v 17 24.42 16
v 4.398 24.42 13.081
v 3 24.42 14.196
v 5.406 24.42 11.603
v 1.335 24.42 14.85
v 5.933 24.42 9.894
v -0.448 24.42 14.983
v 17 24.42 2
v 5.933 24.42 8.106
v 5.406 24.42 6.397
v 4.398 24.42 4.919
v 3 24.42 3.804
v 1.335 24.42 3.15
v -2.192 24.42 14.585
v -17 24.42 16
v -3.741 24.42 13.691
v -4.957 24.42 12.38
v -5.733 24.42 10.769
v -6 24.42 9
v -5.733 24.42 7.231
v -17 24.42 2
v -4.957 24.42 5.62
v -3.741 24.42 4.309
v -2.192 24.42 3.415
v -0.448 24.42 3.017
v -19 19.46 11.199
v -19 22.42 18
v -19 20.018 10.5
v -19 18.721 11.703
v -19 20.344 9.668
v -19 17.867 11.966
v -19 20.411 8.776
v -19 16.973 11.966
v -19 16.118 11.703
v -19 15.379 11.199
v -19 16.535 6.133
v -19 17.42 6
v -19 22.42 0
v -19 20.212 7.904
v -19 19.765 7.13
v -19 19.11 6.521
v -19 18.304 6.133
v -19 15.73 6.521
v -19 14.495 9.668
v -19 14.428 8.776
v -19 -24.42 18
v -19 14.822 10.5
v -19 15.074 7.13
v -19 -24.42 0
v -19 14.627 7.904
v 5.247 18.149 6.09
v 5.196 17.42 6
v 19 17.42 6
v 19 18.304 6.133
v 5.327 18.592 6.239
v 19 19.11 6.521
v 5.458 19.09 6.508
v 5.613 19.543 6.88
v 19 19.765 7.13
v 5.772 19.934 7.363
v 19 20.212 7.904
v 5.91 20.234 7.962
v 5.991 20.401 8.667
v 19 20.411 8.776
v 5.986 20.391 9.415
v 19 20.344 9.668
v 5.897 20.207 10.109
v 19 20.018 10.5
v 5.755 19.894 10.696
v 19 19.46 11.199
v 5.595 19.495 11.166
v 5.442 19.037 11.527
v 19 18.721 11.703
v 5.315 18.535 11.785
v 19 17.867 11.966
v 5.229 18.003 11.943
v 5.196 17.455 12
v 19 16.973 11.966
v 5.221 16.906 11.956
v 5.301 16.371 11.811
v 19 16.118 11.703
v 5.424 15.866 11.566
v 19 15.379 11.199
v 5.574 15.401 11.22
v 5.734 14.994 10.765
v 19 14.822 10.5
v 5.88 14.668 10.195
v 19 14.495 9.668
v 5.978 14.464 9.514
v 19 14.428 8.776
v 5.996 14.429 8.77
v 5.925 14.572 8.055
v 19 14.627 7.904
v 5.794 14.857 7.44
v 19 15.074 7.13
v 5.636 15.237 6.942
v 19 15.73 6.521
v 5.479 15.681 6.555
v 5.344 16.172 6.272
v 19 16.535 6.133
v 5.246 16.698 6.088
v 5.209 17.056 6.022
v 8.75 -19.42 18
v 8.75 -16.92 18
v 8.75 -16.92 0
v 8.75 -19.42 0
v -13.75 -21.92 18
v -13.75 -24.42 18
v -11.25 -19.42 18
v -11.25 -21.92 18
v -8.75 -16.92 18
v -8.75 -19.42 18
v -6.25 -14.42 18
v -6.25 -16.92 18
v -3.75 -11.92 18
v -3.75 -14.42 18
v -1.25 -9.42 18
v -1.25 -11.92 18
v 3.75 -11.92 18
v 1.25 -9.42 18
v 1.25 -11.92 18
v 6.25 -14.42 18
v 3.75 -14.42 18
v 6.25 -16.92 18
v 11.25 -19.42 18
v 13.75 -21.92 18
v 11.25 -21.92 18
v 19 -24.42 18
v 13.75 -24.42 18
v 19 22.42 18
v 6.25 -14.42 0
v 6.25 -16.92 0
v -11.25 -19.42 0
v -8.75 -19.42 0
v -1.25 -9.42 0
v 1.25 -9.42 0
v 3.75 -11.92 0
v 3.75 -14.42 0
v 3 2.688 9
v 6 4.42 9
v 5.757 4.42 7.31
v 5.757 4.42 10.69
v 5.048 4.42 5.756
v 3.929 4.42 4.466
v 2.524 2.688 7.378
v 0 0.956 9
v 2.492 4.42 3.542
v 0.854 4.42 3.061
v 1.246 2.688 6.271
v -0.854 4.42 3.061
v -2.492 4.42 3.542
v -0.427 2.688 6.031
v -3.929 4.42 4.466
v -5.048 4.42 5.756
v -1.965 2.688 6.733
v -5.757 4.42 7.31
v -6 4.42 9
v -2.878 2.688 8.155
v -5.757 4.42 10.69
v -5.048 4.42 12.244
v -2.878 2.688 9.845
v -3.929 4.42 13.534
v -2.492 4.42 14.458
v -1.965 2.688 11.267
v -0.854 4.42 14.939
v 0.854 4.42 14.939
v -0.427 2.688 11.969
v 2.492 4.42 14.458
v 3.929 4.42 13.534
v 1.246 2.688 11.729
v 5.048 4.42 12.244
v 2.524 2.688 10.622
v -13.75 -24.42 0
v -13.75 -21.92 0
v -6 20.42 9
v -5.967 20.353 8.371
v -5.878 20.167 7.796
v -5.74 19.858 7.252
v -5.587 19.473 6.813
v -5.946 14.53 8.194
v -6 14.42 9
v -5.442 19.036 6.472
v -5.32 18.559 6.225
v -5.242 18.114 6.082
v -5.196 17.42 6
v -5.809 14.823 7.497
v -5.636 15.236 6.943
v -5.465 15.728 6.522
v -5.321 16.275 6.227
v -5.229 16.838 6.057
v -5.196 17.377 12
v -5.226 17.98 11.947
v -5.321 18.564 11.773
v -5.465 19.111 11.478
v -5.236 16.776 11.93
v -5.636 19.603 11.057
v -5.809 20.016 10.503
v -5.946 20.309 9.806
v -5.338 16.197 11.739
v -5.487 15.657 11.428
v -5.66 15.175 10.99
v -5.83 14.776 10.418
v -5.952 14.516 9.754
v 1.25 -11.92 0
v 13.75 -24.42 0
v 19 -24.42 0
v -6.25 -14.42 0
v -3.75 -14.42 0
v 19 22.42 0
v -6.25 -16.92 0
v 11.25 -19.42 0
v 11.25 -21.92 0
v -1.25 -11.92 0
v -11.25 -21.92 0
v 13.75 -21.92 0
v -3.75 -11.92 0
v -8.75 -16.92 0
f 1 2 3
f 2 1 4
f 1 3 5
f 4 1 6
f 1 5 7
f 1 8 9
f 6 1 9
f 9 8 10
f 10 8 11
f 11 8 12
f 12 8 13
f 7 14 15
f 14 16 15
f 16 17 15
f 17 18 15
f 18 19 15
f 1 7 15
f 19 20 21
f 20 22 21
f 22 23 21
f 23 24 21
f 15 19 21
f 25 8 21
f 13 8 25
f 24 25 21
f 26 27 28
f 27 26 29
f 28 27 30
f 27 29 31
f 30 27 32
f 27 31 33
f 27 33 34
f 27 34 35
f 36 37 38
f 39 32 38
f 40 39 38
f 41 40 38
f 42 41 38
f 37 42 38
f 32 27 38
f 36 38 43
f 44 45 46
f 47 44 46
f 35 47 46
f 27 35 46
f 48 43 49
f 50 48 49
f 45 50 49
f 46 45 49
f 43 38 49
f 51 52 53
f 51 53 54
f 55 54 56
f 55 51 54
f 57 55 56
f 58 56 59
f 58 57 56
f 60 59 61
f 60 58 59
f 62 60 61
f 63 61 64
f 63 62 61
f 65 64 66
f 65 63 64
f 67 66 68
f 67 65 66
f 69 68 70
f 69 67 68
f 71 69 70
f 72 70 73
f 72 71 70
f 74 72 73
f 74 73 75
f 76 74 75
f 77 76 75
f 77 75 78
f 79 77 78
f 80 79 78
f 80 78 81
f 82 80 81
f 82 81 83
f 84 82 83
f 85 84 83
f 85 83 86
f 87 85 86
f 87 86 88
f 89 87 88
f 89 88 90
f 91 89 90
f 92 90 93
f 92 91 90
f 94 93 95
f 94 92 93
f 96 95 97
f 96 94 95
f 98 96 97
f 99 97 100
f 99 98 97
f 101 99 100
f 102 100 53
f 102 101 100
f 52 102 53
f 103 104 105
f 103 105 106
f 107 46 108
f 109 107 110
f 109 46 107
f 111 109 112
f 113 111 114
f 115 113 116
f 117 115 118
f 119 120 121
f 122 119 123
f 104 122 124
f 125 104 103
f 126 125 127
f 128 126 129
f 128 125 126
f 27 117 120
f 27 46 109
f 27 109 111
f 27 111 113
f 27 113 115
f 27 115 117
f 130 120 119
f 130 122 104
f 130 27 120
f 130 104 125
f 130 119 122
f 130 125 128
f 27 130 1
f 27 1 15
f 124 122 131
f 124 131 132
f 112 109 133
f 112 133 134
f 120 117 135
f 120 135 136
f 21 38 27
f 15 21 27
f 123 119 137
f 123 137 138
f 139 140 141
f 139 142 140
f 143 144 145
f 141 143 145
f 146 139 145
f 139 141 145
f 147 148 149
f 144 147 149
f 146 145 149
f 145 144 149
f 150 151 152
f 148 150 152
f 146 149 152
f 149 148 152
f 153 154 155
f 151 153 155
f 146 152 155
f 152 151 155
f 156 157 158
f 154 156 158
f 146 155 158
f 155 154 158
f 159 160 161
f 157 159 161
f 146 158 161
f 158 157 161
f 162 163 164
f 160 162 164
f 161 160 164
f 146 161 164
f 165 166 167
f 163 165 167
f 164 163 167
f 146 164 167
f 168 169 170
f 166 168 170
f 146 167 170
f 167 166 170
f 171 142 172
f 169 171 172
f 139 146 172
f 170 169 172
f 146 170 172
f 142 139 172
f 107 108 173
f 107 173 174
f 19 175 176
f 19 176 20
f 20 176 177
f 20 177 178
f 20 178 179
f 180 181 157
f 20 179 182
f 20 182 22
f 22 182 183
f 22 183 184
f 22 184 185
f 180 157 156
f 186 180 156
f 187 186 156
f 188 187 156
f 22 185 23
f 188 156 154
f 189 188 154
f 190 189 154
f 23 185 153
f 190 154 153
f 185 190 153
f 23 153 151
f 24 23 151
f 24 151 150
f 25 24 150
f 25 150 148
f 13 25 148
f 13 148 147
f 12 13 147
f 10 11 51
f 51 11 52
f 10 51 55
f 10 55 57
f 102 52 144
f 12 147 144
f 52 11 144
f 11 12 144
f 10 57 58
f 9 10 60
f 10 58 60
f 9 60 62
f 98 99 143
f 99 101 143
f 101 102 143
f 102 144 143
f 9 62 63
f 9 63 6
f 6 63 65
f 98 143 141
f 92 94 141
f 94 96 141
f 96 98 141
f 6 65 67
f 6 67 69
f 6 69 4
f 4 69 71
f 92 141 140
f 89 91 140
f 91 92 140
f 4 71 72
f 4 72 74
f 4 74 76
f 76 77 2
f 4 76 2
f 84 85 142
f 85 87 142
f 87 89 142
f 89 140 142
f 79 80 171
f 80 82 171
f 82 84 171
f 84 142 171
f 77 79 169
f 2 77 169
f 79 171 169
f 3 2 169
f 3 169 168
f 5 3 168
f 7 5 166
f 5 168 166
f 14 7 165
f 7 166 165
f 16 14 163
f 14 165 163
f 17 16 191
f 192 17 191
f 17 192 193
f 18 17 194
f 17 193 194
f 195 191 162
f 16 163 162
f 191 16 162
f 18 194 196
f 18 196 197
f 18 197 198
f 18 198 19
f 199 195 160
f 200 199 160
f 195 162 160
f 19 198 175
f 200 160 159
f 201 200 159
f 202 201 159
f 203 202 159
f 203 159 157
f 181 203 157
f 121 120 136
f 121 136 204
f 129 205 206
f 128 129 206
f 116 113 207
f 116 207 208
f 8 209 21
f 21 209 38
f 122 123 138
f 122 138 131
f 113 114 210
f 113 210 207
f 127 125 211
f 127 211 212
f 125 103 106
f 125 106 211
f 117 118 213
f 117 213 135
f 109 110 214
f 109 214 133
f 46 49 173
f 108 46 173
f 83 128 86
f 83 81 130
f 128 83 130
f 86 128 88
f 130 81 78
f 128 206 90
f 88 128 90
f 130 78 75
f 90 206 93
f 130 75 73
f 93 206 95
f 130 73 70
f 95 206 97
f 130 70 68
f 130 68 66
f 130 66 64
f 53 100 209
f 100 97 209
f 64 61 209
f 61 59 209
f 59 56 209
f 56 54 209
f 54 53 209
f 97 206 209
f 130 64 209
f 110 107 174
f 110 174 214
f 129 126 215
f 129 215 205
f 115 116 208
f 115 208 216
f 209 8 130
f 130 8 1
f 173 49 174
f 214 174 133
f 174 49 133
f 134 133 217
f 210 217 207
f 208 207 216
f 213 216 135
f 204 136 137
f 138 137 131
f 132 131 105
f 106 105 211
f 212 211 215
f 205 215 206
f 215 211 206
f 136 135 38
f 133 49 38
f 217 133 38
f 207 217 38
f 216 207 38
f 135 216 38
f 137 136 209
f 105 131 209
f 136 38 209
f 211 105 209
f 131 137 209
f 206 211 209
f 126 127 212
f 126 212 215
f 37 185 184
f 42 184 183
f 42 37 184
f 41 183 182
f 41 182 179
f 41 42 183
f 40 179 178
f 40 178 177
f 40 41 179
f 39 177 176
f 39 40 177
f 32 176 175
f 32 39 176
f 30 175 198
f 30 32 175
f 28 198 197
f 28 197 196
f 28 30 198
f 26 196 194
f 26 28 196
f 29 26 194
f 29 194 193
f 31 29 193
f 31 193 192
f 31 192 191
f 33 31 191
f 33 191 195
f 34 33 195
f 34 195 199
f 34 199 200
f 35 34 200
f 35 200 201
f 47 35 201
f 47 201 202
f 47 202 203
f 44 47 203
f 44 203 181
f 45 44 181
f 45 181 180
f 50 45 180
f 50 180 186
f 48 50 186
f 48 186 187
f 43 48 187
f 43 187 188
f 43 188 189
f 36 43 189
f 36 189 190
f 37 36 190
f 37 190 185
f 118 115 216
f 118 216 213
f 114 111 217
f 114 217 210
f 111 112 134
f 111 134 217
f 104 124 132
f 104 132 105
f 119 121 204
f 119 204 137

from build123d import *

# Parameters (mm, degrees)
BOSS_EXTRUDE1_DEPTH       = 18
CHAMFER1_SIZE             = 2
CUT_EXTRUDE1_DEPTH        = 49.624263051
CUT_EXTRUDE1_DEPTH_BACK   = 49.624263051
SKETCH3_R                 = 3
F_1_0MM_DOWEL_HOLE1_D     = 12
F_1_0MM_DOWEL_HOLE1_DEPTH = 20
F_1_0MM_DOWEL_HOLE1_TIP   = 3.464101615


with BuildPart() as part:
    # Sketch1 → Boss-Extrude1 (new body)
    with BuildSketch(Plane.XY):
        Polygon((-13.75, -24.419642857), (-13.75, -21.919642857), (-11.25, -21.919642857), (-11.25, -19.419642857), (-8.75, -19.419642857), (-8.75, -16.919642857), (-6.25, -16.919642857), (-6.25, -14.419642857), (-3.75, -14.419642857), (-3.75, -11.919642857), (-1.25, -11.919642857), (-1.25, -9.419642857), (1.25, -9.419642857), (1.25, -11.919642857), (3.75, -11.919642857), (3.75, -14.419642857), (6.25, -14.419642857), (6.25, -16.919642857), (8.75, -16.919642857), (8.75, -19.419642857), (11.25, -19.419642857), (11.25, -21.919642857), (13.75, -21.919642857), (13.75, -24.419642857), (19, -24.419642857), (19, 24.419642857), (-19, 24.419642857), (-19, -24.419642857), align=None)
    extrude(amount=BOSS_EXTRUDE1_DEPTH)

    # Chamfer1
    chamfer1_edges = [part.edges().sort_by_distance(p)[0] for p in [
        (0, 24.419642857, 0),
        (-19, 24.419642857, 9),
        (19, 24.419642857, 9),
        (0, 24.419642857, 18),
    ]]
    chamfer(chamfer1_edges, length=CHAMFER1_SIZE)

    # Sketch3 → Cut-Extrude1 (cut, two sides: drawn at the far end of the back side and taken through both)
    with BuildSketch(Plane(origin=(19, 0, 0), x_dir=(0, 0, -1), z_dir=(1, 0, 0)).offset(-CUT_EXTRUDE1_DEPTH_BACK)):
        with Locations((-9, 17.419642857)):
            Circle(SKETCH3_R)
    extrude(amount=CUT_EXTRUDE1_DEPTH + CUT_EXTRUDE1_DEPTH_BACK, mode=Mode.SUBTRACT)

    # Ø1.0mm Dowel Hole1
    with Locations(Plane(origin=(0, 24.419642857, 0), x_dir=(1, 0, 0), z_dir=(0, 1, 0))):
        with Locations((0, -9)):
            Hole(F_1_0MM_DOWEL_HOLE1_D / 2, depth=F_1_0MM_DOWEL_HOLE1_DEPTH)
            with Locations((0, 0, -(F_1_0MM_DOWEL_HOLE1_DEPTH + F_1_0MM_DOWEL_HOLE1_TIP / 2))):  # 120° drill point
                Cone(0, F_1_0MM_DOWEL_HOLE1_D / 2, F_1_0MM_DOWEL_HOLE1_TIP, mode=Mode.SUBTRACT)


solid = part.part
